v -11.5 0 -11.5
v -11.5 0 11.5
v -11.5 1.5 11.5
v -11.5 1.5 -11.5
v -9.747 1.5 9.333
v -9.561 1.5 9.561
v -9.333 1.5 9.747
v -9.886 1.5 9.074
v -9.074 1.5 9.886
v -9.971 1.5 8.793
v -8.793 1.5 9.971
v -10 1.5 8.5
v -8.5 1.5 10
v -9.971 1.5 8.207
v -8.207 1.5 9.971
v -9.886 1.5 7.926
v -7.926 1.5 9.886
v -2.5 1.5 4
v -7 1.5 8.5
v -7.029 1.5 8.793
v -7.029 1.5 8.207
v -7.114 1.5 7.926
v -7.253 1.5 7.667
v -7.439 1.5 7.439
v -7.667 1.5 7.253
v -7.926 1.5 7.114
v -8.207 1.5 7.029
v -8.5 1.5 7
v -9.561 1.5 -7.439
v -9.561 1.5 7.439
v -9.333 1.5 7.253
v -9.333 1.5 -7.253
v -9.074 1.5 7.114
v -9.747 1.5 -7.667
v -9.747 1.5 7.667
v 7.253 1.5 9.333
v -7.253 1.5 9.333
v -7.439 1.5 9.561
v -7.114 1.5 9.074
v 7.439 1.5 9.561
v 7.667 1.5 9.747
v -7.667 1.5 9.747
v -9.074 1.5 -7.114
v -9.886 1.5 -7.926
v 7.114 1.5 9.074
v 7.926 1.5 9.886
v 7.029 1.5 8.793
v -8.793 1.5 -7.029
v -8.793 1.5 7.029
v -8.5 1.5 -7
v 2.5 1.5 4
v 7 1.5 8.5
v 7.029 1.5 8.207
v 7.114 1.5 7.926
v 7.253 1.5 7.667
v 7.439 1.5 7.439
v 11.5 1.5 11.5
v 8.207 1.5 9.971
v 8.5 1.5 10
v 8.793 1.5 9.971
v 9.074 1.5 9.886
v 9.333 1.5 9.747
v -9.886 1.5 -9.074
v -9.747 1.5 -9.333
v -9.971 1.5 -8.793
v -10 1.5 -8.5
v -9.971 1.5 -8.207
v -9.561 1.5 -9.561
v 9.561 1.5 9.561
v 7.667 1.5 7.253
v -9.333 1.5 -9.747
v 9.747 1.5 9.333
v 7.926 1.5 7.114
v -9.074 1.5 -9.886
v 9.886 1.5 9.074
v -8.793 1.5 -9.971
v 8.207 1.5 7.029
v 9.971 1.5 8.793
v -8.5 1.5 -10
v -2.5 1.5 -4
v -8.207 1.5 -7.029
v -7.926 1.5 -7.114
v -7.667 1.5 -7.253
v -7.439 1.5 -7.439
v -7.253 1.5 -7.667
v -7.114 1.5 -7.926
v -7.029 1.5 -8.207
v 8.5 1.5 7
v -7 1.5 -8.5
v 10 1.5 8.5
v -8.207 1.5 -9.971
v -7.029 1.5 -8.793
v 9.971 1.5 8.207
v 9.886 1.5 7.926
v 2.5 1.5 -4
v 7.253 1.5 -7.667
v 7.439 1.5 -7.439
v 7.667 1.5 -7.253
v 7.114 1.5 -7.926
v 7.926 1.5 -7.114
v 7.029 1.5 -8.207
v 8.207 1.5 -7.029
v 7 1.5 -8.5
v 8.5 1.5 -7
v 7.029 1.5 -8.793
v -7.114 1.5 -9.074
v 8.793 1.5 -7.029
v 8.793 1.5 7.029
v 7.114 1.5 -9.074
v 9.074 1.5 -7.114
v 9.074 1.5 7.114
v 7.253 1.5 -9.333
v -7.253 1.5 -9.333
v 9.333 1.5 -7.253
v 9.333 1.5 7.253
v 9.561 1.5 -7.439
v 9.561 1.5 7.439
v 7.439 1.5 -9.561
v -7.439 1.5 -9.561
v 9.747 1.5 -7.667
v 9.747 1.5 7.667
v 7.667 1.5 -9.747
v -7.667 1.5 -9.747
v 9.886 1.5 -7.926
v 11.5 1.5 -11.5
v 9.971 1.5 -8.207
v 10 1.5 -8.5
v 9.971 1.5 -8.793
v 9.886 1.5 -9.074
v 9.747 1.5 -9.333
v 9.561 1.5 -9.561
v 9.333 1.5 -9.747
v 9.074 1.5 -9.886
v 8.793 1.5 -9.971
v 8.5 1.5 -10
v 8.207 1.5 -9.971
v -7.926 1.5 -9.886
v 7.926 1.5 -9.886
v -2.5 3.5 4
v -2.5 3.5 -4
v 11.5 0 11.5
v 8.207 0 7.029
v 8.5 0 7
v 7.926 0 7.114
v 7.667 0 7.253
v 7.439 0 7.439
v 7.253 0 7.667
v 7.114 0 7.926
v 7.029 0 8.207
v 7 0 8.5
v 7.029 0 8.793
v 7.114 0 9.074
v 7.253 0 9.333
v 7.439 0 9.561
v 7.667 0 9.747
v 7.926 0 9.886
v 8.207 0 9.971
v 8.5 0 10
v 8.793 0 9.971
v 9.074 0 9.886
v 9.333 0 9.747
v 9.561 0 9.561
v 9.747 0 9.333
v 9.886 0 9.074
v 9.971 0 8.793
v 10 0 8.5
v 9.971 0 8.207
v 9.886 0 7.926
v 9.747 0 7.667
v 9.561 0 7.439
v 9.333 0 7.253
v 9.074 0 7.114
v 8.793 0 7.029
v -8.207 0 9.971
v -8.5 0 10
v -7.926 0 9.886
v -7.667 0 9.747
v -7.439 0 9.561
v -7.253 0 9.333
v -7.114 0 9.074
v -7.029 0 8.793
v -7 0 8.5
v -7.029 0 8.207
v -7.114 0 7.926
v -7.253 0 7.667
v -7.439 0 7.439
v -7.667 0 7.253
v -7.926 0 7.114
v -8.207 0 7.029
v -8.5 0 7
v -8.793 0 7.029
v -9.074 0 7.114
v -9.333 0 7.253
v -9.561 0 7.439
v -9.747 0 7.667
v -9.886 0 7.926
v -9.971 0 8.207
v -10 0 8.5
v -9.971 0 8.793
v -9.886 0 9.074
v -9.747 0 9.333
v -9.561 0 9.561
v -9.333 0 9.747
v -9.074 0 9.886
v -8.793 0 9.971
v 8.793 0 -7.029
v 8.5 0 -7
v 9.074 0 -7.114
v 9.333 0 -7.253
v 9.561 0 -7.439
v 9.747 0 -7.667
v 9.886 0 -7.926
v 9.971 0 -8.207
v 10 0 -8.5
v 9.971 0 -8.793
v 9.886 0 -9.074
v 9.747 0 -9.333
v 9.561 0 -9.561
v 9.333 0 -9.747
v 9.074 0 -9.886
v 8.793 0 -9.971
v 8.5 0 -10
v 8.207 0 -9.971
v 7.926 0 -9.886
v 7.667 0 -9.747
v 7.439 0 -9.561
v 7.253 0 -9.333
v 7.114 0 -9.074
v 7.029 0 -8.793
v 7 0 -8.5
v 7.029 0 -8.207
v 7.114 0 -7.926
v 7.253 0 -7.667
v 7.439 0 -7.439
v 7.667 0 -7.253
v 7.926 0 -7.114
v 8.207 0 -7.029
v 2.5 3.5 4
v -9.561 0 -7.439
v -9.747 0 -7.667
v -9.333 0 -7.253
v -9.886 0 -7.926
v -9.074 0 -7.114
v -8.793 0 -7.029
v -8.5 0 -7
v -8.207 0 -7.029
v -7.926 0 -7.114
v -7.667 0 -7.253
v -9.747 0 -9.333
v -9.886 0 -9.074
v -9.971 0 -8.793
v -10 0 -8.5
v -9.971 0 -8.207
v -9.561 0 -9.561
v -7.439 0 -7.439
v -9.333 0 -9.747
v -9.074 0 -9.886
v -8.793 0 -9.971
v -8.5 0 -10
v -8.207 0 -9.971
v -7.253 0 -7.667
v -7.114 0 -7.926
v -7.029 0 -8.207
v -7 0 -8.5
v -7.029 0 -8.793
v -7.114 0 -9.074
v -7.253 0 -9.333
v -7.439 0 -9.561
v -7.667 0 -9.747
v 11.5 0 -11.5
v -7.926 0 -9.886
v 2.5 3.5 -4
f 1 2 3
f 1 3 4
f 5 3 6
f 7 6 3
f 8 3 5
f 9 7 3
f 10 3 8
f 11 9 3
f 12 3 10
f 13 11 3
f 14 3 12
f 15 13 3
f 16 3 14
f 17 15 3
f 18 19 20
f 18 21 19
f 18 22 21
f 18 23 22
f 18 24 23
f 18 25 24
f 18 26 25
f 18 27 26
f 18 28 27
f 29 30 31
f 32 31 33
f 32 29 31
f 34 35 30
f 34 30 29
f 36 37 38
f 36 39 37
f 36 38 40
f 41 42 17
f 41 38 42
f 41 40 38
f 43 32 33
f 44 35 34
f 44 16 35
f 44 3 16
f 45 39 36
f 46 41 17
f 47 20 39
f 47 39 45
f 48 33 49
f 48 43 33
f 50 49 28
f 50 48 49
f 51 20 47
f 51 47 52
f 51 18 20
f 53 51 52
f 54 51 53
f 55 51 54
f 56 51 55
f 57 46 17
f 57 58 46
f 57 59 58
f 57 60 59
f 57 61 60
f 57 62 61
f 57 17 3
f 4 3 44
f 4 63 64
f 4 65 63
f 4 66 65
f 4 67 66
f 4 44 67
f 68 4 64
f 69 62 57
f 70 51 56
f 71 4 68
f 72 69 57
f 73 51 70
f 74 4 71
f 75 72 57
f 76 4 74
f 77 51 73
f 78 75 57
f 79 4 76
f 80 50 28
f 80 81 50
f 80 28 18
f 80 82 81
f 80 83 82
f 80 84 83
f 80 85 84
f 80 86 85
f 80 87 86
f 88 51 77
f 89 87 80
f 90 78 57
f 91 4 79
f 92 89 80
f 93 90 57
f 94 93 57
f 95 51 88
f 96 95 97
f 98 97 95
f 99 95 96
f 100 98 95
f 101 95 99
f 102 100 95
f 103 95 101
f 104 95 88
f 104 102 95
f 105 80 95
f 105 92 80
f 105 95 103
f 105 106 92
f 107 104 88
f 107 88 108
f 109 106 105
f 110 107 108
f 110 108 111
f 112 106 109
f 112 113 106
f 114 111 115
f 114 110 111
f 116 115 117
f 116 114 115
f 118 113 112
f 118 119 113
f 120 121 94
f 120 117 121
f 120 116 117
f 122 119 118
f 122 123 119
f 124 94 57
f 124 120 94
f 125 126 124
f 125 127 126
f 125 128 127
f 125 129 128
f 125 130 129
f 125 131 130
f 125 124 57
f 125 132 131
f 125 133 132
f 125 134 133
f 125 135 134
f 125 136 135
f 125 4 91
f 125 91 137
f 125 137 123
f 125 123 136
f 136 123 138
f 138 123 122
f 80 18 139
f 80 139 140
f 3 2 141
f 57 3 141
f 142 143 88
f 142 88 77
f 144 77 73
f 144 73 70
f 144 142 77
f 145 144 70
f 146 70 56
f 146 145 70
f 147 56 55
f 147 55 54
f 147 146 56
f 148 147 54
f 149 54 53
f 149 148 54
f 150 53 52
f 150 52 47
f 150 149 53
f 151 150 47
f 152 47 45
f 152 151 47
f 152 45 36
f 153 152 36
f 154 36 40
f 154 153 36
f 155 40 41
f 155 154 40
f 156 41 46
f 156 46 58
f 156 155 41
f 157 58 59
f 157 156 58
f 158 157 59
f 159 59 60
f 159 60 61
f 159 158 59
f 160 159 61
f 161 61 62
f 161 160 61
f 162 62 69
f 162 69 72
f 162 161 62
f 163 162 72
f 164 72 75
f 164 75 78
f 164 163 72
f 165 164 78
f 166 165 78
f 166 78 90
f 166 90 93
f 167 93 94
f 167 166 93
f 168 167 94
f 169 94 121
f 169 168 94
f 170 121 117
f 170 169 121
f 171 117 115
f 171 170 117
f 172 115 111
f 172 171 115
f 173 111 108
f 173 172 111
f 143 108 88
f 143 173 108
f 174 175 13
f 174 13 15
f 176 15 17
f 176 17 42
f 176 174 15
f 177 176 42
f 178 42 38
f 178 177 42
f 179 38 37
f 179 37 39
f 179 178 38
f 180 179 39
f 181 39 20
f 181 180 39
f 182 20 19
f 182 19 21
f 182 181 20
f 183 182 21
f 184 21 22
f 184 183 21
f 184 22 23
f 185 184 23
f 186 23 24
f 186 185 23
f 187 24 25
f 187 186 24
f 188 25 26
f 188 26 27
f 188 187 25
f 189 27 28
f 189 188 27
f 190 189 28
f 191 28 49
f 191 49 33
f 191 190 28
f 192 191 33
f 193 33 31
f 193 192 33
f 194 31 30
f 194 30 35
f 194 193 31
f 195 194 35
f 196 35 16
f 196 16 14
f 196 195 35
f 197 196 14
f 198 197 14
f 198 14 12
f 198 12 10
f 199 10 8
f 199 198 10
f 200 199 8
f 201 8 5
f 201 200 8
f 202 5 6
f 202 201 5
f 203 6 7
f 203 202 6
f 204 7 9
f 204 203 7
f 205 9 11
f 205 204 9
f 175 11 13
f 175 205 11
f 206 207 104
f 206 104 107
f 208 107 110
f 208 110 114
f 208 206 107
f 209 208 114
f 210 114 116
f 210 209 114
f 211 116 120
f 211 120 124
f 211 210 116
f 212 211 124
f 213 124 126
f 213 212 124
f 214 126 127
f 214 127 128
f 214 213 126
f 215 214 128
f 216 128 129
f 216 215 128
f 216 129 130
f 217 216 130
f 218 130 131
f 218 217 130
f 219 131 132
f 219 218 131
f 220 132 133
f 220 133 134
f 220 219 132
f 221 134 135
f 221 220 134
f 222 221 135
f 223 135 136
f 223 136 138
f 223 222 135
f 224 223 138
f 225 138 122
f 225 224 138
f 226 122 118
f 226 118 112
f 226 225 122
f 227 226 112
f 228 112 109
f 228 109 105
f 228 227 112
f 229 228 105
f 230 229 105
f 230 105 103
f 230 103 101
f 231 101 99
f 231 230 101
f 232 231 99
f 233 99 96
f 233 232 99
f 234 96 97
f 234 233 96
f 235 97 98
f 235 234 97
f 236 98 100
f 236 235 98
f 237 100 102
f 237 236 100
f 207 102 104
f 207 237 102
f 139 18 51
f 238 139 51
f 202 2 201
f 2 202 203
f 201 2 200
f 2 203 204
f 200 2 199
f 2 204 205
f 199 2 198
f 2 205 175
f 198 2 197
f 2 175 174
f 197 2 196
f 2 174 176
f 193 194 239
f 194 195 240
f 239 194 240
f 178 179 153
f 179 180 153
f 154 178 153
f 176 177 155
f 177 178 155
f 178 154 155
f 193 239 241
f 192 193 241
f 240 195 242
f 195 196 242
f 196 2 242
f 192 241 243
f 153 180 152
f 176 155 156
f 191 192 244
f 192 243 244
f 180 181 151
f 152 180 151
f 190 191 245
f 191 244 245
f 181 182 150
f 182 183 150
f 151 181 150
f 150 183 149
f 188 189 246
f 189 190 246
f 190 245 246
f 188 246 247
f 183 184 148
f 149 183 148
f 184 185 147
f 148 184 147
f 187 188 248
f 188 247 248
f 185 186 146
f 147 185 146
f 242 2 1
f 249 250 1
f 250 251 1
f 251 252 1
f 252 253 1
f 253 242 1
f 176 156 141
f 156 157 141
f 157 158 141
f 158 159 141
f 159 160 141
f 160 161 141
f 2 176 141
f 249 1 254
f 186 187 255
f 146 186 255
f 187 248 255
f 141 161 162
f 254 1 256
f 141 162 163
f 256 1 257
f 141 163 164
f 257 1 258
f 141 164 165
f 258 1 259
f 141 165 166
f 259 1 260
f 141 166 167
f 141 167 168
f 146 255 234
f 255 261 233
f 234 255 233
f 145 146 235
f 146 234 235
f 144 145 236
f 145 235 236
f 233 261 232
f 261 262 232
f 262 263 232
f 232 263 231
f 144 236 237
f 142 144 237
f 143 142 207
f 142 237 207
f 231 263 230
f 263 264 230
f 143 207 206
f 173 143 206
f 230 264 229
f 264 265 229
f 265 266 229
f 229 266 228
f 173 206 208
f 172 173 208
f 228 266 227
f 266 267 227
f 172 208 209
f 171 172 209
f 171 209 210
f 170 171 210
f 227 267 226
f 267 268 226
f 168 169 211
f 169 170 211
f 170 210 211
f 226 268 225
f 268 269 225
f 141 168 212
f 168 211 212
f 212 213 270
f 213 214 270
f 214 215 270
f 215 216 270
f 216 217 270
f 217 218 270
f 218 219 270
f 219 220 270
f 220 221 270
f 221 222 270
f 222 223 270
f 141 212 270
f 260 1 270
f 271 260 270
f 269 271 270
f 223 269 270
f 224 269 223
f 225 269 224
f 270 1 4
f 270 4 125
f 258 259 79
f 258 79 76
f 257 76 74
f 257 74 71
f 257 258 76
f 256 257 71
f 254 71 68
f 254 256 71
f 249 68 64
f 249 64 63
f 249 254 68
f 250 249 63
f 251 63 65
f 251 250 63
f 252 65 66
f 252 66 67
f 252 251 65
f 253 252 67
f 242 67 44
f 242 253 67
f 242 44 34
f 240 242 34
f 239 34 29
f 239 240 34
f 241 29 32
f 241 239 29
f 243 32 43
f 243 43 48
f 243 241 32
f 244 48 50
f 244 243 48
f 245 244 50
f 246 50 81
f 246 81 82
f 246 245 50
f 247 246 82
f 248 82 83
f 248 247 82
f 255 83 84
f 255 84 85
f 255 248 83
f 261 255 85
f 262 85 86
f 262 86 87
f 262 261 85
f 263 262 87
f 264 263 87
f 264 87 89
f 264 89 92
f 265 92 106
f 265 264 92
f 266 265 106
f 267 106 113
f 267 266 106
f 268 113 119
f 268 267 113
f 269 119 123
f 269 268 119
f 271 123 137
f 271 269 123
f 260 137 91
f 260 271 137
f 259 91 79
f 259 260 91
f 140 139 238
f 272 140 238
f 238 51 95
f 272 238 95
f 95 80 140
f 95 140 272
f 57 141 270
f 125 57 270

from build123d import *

# Parameters (mm, degrees)
SKETCH_1_W      = 23
SKETCH_1_H      = 23
SKETCH_1_R      = 1.5
EXTRUDE_1_DEPTH = 1.5
SKETCH_2_W      = 5
SKETCH_2_H      = 8
EXTRUDE_2_DEPTH = 2


with BuildPart() as part:
    # 草图1 → 凸台-拉伸1 (new body)
    with BuildSketch(Plane(origin=(0, 0, 0), x_dir=(1, 0, 0), z_dir=(0, 1, 0))):
        Rectangle(SKETCH_1_W, SKETCH_1_H)
        with Locations(Location((8.5, 8.5, 0), (0, 0, 270))):
            Circle(SKETCH_1_R, mode=Mode.SUBTRACT)
        with Locations(Location((8.5, -8.5, 0), (0, 0, 90))):
            Circle(SKETCH_1_R, mode=Mode.SUBTRACT)
        with Locations(Location((-8.5, -8.5, 0), (0, 0, 270))):
            Circle(SKETCH_1_R, mode=Mode.SUBTRACT)
        with Locations(Location((-8.5, 8.5, 0), (0, 0, 90))):
            Circle(SKETCH_1_R, mode=Mode.SUBTRACT)
    extrude(amount=EXTRUDE_1_DEPTH)

    # 草图2 → 凸台-拉伸2 (add)
    with BuildSketch(Plane(origin=(0, 1.5, 0), x_dir=(1, 0, 0), z_dir=(0, 1, 0))):
        Rectangle(SKETCH_2_W, SKETCH_2_H)
    extrude(amount=EXTRUDE_2_DEPTH)


solid = part.part
